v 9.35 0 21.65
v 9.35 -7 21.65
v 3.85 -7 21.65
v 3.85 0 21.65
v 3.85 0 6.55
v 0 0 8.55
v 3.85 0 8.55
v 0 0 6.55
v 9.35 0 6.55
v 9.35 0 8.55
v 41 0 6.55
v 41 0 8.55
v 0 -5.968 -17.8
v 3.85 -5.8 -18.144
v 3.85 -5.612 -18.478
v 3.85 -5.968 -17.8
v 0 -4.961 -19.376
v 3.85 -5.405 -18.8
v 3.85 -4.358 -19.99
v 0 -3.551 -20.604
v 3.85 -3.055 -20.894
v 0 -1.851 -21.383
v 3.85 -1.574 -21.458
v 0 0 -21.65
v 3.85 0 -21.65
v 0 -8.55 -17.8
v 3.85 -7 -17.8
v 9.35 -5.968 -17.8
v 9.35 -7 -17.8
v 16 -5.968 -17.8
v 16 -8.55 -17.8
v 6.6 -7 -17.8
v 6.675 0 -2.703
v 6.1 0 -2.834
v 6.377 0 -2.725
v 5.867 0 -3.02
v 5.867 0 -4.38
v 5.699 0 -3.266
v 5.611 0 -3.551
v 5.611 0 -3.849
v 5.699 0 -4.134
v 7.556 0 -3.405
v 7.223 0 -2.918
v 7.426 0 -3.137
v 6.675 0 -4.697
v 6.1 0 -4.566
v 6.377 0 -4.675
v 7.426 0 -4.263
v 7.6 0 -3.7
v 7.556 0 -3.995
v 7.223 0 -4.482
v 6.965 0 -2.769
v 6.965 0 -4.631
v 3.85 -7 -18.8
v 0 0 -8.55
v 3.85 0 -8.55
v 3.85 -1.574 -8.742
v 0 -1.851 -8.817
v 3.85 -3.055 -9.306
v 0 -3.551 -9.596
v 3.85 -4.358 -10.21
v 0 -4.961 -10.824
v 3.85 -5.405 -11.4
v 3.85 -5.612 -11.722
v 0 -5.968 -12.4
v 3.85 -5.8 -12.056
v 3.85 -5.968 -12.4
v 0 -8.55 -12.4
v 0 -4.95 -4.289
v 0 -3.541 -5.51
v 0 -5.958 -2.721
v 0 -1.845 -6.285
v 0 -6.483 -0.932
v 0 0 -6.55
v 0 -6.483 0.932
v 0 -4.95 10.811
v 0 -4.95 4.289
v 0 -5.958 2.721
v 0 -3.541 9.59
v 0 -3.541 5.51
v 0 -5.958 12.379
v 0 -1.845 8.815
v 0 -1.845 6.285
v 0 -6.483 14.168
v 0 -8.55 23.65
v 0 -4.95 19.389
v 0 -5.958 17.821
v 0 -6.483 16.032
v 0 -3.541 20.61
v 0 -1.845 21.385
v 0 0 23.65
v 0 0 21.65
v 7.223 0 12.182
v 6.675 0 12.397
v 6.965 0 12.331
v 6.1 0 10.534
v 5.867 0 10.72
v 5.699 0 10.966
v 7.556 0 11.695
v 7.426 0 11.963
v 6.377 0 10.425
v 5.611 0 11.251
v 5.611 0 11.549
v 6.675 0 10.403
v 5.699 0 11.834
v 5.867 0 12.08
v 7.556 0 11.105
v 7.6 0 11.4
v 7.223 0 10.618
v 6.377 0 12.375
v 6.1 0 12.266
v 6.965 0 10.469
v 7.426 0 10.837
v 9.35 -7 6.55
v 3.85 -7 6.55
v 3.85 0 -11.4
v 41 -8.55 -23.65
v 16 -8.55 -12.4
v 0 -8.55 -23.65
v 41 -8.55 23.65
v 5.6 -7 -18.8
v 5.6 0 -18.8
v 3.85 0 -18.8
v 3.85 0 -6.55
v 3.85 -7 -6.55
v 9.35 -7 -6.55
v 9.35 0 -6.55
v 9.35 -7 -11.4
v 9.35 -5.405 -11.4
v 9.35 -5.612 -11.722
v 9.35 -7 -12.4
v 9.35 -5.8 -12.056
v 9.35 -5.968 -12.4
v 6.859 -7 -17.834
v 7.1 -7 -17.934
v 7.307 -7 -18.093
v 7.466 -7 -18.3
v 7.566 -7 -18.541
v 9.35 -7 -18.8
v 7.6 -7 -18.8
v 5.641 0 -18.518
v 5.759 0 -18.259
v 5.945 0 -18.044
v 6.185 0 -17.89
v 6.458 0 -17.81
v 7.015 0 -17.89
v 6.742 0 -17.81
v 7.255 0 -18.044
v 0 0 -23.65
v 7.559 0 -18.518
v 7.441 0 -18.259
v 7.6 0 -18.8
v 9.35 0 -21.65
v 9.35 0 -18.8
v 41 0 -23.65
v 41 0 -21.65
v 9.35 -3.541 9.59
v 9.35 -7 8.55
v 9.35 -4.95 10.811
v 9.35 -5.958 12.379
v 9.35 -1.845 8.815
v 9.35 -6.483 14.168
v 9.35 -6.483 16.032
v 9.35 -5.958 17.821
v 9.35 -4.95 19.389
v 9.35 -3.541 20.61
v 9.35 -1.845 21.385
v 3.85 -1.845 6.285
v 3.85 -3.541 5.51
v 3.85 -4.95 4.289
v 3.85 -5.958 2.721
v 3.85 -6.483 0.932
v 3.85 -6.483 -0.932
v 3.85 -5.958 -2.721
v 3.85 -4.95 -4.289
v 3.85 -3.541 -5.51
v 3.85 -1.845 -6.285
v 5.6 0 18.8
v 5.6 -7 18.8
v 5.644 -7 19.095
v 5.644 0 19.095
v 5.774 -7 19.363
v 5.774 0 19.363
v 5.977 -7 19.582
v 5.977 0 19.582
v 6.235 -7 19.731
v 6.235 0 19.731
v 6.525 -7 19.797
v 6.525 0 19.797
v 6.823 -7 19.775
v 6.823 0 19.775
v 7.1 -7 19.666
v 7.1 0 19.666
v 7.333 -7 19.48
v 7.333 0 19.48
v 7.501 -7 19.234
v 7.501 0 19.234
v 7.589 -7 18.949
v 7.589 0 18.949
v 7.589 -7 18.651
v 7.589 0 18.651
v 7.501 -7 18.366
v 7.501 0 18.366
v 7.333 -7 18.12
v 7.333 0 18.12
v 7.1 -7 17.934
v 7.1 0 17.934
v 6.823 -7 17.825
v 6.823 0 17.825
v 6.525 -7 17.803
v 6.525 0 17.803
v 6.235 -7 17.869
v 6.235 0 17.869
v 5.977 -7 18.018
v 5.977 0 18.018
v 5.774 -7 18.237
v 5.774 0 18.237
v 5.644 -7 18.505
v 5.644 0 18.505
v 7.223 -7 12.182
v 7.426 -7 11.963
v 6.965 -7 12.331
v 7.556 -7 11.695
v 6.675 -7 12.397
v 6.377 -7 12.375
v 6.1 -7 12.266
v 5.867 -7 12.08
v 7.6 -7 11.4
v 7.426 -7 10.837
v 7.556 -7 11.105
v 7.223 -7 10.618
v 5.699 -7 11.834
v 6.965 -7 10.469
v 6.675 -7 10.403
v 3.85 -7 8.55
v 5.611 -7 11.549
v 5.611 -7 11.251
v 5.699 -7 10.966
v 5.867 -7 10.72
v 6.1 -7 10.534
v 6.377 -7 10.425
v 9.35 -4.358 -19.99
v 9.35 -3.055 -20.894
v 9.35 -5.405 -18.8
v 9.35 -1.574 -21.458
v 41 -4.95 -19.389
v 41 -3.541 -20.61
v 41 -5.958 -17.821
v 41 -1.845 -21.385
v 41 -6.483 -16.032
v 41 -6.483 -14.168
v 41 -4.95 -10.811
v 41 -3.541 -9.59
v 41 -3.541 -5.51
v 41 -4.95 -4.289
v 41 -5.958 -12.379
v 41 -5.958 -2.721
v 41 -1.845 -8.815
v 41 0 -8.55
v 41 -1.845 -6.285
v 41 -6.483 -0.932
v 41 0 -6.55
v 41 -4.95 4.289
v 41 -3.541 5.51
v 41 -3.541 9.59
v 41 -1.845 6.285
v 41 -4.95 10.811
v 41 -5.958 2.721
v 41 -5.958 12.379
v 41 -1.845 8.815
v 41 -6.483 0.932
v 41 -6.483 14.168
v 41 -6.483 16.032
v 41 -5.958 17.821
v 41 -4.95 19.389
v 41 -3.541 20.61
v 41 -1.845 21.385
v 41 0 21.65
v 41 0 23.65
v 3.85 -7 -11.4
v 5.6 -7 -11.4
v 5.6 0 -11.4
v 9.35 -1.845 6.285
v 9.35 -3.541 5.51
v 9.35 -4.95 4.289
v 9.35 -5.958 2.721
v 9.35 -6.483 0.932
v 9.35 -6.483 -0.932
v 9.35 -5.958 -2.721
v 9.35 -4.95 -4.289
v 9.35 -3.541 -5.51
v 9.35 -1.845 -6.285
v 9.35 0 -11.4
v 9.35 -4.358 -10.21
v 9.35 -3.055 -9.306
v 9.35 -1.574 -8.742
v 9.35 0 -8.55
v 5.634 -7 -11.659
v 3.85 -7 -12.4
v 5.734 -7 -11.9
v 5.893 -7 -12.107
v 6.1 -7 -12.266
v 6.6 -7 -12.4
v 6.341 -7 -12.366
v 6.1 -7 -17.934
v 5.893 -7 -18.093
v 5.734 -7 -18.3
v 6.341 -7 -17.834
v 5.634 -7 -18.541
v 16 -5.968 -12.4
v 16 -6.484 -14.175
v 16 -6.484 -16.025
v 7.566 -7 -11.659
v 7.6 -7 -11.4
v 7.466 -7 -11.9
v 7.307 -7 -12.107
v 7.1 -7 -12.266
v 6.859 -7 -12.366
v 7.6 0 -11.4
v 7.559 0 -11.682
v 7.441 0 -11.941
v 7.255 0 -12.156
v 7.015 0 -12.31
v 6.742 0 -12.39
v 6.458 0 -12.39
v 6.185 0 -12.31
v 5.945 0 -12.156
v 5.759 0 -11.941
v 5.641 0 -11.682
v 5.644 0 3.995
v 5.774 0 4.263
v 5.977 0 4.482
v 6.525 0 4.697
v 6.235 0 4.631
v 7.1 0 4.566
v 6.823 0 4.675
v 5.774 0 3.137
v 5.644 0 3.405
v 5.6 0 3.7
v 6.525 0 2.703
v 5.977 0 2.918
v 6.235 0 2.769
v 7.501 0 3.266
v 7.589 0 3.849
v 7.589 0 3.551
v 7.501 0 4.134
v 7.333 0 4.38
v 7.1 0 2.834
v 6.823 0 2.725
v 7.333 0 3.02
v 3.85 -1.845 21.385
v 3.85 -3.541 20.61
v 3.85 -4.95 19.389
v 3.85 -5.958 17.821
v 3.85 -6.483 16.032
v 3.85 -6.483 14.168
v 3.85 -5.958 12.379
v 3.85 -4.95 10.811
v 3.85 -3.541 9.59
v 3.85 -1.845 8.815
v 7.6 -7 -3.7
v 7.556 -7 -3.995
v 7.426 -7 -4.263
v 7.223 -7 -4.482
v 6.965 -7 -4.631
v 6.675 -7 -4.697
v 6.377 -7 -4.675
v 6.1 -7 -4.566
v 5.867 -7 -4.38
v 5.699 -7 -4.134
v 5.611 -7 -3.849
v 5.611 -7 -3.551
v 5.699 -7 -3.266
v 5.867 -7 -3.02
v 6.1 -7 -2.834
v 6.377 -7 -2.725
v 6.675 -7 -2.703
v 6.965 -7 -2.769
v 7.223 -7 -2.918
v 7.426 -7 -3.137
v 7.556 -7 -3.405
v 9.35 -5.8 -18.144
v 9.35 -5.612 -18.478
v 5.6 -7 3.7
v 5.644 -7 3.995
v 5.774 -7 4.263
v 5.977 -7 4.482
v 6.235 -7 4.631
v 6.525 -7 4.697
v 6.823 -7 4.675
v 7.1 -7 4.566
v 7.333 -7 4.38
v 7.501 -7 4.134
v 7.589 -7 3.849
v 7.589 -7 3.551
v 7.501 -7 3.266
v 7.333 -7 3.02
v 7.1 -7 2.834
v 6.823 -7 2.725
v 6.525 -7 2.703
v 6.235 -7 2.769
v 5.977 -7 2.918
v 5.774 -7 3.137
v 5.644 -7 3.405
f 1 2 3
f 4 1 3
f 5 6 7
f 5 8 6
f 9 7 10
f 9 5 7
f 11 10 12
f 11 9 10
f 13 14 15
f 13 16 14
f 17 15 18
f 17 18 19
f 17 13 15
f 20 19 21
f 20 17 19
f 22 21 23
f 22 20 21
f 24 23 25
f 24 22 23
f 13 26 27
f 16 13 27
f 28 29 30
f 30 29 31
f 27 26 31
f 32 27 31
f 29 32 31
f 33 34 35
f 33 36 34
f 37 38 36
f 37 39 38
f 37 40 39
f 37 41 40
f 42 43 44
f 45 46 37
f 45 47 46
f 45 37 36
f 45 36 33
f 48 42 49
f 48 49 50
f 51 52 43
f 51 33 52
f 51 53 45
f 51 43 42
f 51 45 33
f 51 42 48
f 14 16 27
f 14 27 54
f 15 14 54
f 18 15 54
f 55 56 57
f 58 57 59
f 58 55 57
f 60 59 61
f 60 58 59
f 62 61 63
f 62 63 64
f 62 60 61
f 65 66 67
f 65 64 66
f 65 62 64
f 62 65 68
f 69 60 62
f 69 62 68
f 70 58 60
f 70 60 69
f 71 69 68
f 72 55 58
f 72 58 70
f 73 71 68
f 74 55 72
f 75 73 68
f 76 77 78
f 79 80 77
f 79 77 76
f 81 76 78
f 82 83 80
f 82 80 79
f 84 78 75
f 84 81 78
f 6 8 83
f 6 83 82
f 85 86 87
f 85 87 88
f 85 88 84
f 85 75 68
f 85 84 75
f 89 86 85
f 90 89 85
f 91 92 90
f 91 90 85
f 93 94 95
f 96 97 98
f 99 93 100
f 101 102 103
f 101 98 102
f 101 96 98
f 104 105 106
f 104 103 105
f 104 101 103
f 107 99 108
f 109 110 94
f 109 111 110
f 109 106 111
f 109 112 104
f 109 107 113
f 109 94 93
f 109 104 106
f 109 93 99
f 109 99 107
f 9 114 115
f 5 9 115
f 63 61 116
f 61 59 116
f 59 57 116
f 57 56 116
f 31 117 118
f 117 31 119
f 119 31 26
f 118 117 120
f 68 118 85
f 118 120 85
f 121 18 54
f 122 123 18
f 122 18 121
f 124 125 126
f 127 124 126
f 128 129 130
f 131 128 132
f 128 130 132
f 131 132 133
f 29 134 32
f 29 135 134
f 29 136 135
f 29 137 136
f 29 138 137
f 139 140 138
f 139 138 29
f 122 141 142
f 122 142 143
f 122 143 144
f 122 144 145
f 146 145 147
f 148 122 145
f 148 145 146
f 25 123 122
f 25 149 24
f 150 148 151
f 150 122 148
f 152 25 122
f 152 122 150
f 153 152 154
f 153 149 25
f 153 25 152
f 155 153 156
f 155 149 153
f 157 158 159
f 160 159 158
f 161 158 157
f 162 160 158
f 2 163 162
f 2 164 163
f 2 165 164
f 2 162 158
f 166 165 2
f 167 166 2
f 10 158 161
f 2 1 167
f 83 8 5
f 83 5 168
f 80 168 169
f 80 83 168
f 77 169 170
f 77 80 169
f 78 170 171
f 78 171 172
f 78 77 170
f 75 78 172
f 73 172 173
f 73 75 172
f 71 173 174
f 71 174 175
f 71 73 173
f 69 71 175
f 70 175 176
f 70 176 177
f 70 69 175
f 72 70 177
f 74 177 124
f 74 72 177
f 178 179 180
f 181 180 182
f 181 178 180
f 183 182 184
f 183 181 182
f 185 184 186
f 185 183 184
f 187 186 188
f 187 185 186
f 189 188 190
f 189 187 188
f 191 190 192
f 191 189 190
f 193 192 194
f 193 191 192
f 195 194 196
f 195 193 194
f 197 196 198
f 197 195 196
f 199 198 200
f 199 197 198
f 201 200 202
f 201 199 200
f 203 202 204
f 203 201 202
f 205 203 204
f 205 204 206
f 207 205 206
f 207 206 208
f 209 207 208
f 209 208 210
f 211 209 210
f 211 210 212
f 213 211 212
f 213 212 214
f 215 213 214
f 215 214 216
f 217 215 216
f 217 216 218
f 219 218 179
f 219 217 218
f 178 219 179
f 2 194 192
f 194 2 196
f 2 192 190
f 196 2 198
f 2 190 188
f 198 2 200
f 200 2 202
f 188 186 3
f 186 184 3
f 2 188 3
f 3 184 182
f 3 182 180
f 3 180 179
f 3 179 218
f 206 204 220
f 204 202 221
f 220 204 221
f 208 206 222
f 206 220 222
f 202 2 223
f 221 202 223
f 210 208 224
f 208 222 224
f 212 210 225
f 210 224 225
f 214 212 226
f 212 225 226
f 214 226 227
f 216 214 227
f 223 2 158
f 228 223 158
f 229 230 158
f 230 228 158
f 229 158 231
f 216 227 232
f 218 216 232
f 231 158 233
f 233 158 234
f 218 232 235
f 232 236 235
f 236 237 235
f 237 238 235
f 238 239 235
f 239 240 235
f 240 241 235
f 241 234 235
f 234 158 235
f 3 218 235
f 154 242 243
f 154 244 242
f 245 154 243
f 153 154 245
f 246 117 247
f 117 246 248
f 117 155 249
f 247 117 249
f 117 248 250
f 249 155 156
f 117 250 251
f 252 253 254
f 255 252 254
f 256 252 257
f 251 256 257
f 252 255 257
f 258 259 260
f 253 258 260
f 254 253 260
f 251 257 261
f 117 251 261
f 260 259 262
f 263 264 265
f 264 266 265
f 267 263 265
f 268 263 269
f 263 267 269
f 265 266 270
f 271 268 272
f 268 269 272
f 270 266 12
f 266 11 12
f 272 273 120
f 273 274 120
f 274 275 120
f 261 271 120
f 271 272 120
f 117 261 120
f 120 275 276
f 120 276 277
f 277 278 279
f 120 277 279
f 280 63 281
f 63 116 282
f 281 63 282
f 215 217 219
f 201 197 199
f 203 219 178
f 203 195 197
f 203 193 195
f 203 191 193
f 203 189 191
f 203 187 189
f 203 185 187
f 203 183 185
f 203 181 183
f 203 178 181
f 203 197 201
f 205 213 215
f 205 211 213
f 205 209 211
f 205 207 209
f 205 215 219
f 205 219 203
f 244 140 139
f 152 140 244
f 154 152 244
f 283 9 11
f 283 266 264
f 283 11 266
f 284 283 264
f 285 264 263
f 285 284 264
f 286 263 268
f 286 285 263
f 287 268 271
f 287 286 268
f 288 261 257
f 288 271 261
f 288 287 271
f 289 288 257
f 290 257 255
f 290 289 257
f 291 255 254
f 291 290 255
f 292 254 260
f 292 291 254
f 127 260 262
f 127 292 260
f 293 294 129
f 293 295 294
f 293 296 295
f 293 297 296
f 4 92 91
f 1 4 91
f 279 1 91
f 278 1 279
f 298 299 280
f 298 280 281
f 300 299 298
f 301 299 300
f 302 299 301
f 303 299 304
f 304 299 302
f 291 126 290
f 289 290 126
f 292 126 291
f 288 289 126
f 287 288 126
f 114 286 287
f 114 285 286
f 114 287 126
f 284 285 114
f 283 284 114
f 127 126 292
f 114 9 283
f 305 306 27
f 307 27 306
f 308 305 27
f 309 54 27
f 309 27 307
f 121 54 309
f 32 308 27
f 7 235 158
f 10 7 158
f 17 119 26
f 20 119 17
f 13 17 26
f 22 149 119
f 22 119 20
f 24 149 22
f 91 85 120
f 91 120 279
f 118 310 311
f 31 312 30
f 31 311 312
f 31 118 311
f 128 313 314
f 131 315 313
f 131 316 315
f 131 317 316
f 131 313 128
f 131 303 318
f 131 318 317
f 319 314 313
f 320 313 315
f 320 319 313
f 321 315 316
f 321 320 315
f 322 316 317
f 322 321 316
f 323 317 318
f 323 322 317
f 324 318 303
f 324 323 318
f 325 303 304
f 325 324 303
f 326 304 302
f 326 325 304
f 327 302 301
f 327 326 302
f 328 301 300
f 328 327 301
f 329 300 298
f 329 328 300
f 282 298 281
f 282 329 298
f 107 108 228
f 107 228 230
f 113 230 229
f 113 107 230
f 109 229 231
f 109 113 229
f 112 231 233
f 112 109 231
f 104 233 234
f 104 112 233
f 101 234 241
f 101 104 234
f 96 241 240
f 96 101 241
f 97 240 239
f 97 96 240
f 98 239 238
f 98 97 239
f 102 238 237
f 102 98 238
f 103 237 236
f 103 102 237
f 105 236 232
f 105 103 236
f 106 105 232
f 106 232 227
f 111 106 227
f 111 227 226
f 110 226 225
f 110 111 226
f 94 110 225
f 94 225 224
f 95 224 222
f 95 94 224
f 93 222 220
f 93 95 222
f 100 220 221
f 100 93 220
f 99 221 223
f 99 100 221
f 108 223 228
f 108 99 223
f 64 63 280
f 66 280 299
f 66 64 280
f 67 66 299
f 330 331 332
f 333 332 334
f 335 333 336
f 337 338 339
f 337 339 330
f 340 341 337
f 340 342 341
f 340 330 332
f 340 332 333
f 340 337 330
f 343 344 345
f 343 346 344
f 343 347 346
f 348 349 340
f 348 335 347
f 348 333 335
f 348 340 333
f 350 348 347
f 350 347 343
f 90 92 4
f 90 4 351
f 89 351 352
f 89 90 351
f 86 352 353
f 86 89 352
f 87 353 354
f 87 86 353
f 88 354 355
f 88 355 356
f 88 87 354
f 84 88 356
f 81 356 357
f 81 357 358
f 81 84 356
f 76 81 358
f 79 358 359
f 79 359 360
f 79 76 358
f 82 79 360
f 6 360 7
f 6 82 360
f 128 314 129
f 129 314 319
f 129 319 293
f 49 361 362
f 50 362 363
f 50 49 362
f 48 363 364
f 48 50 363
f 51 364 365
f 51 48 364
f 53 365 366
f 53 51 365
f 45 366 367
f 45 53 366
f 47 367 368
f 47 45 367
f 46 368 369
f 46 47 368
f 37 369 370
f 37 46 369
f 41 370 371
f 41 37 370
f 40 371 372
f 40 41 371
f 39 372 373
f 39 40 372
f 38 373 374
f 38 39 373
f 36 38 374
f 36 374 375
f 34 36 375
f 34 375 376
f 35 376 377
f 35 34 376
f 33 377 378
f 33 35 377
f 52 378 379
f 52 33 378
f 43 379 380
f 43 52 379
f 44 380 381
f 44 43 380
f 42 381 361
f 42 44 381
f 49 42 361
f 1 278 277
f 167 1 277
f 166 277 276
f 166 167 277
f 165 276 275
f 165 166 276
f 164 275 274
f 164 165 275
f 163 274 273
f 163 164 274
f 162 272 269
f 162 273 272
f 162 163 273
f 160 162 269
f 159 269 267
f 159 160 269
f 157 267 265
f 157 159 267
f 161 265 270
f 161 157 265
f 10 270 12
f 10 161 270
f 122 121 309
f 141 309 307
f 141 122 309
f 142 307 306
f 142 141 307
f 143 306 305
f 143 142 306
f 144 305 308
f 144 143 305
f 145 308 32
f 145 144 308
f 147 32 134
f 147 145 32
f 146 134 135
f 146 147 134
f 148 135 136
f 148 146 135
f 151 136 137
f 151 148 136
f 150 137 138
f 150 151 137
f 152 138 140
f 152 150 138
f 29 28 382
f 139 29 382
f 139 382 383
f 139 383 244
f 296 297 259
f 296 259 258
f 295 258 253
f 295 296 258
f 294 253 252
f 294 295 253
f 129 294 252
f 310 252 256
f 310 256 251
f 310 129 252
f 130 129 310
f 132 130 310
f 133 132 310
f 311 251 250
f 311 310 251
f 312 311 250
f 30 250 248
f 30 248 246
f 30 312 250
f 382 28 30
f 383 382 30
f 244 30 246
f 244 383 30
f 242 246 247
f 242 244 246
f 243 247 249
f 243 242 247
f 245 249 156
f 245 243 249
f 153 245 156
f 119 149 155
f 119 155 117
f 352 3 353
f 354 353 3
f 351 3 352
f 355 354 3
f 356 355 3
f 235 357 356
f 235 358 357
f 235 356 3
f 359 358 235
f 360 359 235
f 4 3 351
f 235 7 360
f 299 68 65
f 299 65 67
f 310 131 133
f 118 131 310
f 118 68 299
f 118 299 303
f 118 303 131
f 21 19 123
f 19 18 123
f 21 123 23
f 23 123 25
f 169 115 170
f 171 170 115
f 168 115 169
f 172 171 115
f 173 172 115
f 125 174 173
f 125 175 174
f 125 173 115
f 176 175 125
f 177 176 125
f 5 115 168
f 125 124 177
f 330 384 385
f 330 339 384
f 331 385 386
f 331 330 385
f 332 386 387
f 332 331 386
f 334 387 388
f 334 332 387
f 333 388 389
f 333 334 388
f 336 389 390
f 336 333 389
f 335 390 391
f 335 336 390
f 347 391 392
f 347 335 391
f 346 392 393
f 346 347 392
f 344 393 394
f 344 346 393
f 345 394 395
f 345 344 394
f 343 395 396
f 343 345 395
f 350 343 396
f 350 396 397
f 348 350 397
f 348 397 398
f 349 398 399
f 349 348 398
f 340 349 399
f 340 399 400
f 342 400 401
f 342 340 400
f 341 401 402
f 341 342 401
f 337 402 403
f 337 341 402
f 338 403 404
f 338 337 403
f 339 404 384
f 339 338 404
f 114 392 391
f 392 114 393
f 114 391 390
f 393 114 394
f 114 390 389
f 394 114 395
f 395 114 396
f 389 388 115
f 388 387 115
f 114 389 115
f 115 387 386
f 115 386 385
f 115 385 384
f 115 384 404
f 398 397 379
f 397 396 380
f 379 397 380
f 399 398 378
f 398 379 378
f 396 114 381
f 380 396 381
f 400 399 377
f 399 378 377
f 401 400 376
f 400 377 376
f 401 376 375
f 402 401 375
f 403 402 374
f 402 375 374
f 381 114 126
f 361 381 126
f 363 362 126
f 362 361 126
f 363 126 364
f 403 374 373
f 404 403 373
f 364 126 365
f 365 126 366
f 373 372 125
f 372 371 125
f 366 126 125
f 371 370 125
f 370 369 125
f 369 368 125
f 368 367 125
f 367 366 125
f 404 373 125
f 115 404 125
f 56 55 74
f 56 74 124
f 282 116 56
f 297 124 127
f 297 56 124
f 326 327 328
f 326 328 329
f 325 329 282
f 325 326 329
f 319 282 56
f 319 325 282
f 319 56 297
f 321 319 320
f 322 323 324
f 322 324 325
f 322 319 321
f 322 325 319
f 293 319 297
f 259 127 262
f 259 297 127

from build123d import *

# Parameters (mm, degrees)
BOSS_EXTRUDE1_DEPTH     = 41
BOSS_EXTRUDE2_REACH     = 50.098
SKETCH2_R               = 1
SKETCH4_W               = 5.5
SKETCH4_H               = 13.1
SKETCH4_R               = 1
CUT_EXTRUDE1_DEPTH      = 7
SKETCH5_R               = 2.25
BOSS_EXTRUDE3_DEPTH     = 2
BOSS_EXTRUDE4_REACH     = 59.938
SKETCH6_W               = 5.5
SKETCH6_H               = 2.85
CUT_EXTRUDE2_DEPTH      = 7
SKETCH8_W               = 69.342775087
SKETCH8_H               = 71.486609824
SKETCH8_W_2             = 41
SKETCH8_H_2             = 47.3
CUT_EXTRUDE3_DEPTH      = 58.676674836
CUT_EXTRUDE4_DEPTH      = 48.846865116
CUT_EXTRUDE4_DEPTH_BACK = 48.846865116
SKETCH9_W               = 16
SKETCH9_H               = 5.4


with BuildPart() as part:
    # Sketch1 → Boss-Extrude1 (new body)
    with BuildSketch(Plane(origin=(0, 0, 0), x_dir=(0, 0, -1), z_dir=(1, 0, 0))):
        with BuildLine():
            Line((-8.55, 0), (-6.55, 0))
            ThreePointArc((-6.55, 0), (0, -6.55), (6.55, 0))
            Line((6.55, 0), (8.55, 0))
            ThreePointArc((8.55, 0), (15.1, -6.55), (21.65, 0))
            Line((21.65, 0), (23.65, 0))
            Line((23.65, 0), (23.65, -8.55))
            Line((23.65, -8.55), (-23.65, -8.55))
            Line((-23.65, -8.55), (-23.65, 0))
            Line((-23.65, 0), (-21.65, 0))
            ThreePointArc((-21.65, 0), (-15.1, -6.55), (-8.55, 0))
        make_face()
    extrude(amount=BOSS_EXTRUDE1_DEPTH)

    # Sketch2 → Boss-Extrude2 (add, up to next)
    with BuildSketch(Plane(origin=(0, 0, 0), x_dir=(1, 0, 0), z_dir=(0, 1, 0)), mode=Mode.PRIVATE) as boss_extrude2_sk1:
        with Locations(Location((6.6, 3.7, 0), (0, 0, 270))):
            Circle(SKETCH2_R)
    boss_extrude2_tool1 = extrude(boss_extrude2_sk1.sketch, amount=-BOSS_EXTRUDE2_REACH, mode=Mode.PRIVATE) - part.part
    # Sketch2 → Boss-Extrude2 (add, up to next)
    with BuildSketch(Plane(origin=(0, 0, 0), x_dir=(1, 0, 0), z_dir=(0, 1, 0)), mode=Mode.PRIVATE) as boss_extrude2_sk2:
        with Locations(Location((6.6, -3.7, 0), (0, 0, 270))):
            Circle(SKETCH2_R)
    boss_extrude2_tool2 = extrude(boss_extrude2_sk2.sketch, amount=-BOSS_EXTRUDE2_REACH, mode=Mode.PRIVATE) - part.part
    # Sketch2 → Boss-Extrude2 (add, up to next)
    with BuildSketch(Plane(origin=(0, 0, 0), x_dir=(1, 0, 0), z_dir=(0, 1, 0)), mode=Mode.PRIVATE) as boss_extrude2_sk3:
        with Locations(Location((6.6, -11.4, 0), (0, 0, 270))):
            Circle(SKETCH2_R)
    boss_extrude2_tool3 = extrude(boss_extrude2_sk3.sketch, amount=-BOSS_EXTRUDE2_REACH, mode=Mode.PRIVATE) - part.part
    # Sketch2 → Boss-Extrude2 (add, up to next)
    with BuildSketch(Plane(origin=(0, 0, 0), x_dir=(1, 0, 0), z_dir=(0, 1, 0)), mode=Mode.PRIVATE) as boss_extrude2_sk4:
        with Locations(Location((6.6, -18.8, 0), (0, 0, 270))):
            Circle(SKETCH2_R)
    boss_extrude2_tool4 = extrude(boss_extrude2_sk4.sketch, amount=-BOSS_EXTRUDE2_REACH, mode=Mode.PRIVATE) - part.part
    # Sketch2 → Boss-Extrude2 (add, up to next)
    with BuildSketch(Plane(origin=(0, 0, 0), x_dir=(1, 0, 0), z_dir=(0, 1, 0)), mode=Mode.PRIVATE) as boss_extrude2_sk5:
        with Locations(Location((6.6, 18.8, 0), (0, 0, 270))):
            Circle(SKETCH2_R)
    boss_extrude2_tool5 = extrude(boss_extrude2_sk5.sketch, amount=-BOSS_EXTRUDE2_REACH, mode=Mode.PRIVATE) - part.part
    # Sketch2 → Boss-Extrude2 (add, up to next)
    with BuildSketch(Plane(origin=(0, 0, 0), x_dir=(1, 0, 0), z_dir=(0, 1, 0)), mode=Mode.PRIVATE) as boss_extrude2_sk6:
        with Locations(Location((6.6, 11.4, 0), (0, 0, 270))):
            Circle(SKETCH2_R)
    boss_extrude2_tool6 = extrude(boss_extrude2_sk6.sketch, amount=-BOSS_EXTRUDE2_REACH, mode=Mode.PRIVATE) - part.part
    add(boss_extrude2_tool1.solids().sort_by_distance((6.6, 0, -3.7))[0])
    add(boss_extrude2_tool2.solids().sort_by_distance((6.6, 0, 3.7))[0])
    add(boss_extrude2_tool3.solids().sort_by_distance((6.6, 0, 11.4))[0])
    add(boss_extrude2_tool4.solids().sort_by_distance((6.6, 0, 18.8))[0])
    add(boss_extrude2_tool5.solids().sort_by_distance((6.6, 0, -18.8))[0])
    add(boss_extrude2_tool6.solids().sort_by_distance((6.6, 0, -11.4))[0])

    # Sketch4 → Cut-Extrude1 (cut)
    # profile 1 of 3: a face of its own
    with BuildSketch(Plane(origin=(0, 0, 0), x_dir=(1, 0, 0), z_dir=(0, 1, 0))):
        with Locations((6.6, 0)):
            Rectangle(SKETCH4_W, SKETCH4_H)
        with Locations(Location((6.6, 3.7, 0), (0, 0, 270))):
            Circle(SKETCH4_R, mode=Mode.SUBTRACT)
        with Locations(Location((6.6, -3.7, 0), (0, 0, 270))):
            Circle(SKETCH4_R, mode=Mode.SUBTRACT)
    # profile 2 of 3: a face of its own
    with BuildSketch(Plane(origin=(0, 0, 0), x_dir=(1, 0, 0), z_dir=(0, 1, 0))):
        with Locations((6.6, -15.1)):
            Rectangle(SKETCH4_W, SKETCH4_H)
        with Locations(Location((6.6, -11.4, 0), (0, 0, 90))):
            Circle(SKETCH4_R, mode=Mode.SUBTRACT)
        with Locations(Location((6.6, -18.8, 0), (0, 0, 90))):
            Circle(SKETCH4_R, mode=Mode.SUBTRACT)
    # profile 3 of 3: a face of its own
    with BuildSketch(Plane(origin=(0, 0, 0), x_dir=(1, 0, 0), z_dir=(0, 1, 0))):
        with Locations((6.6, 15.1)):
            Rectangle(SKETCH4_W, SKETCH4_H)
        with Locations(Location((6.6, 11.4, 0), (0, 0, 90))):
            Circle(SKETCH4_R, mode=Mode.SUBTRACT)
        with Locations(Location((6.6, 18.8, 0), (0, 0, 90))):
            Circle(SKETCH4_R, mode=Mode.SUBTRACT)
    extrude(amount=-CUT_EXTRUDE1_DEPTH, mode=Mode.SUBTRACT)

    # Sketch5 → Boss-Extrude3 (add)
    # profile 1 of 4: a face of its own
    with BuildSketch(Plane.XZ.offset(8.55)):
        with BuildLine():
            Line((0, 23.65), (0, 20.65))
            Line((0, 20.65), (-5.25520382, 20.65))
            ThreePointArc((-5.25520382, 20.65), (-6.669417382, 21.235786438), (-7.25520382, 22.65))
            Line((-7.25520382, 22.65), (-7.25520382, 28.90520382))
            ThreePointArc((-7.25520382, 28.90520382), (-6.669417382, 30.319417382), (-5.25520382, 30.90520382))
            Line((-5.25520382, 30.90520382), (1, 30.90520382))
            ThreePointArc((1, 30.90520382), (2.414213562, 30.319417382), (3, 28.90520382))
            Line((3, 28.90520382), (3, 23.65))
            Line((3, 23.65), (0, 23.65))
        make_face()
        with Locations(Location((-3.00520382, 26.65520382, 0), (0, 0, 270))):
            Circle(SKETCH5_R, mode=Mode.SUBTRACT)
    # profile 2 of 4: a face of its own
    with BuildSketch(Plane.XZ.offset(8.55)):
        with BuildLine():
            Line((0, -23.65), (3, -23.65))
            Line((3, -23.65), (3, -28.90520382))
            ThreePointArc((3, -28.90520382), (2.414213562, -30.319417382), (1, -30.90520382))
            Line((1, -30.90520382), (-5.25520382, -30.90520382))
            ThreePointArc((-5.25520382, -30.90520382), (-6.669417382, -30.319417382), (-7.25520382, -28.90520382))
            Line((-7.25520382, -28.90520382), (-7.25520382, -22.65))
            ThreePointArc((-7.25520382, -22.65), (-6.669417382, -21.235786438), (-5.25520382, -20.65))
            Line((-5.25520382, -20.65), (0, -20.65))
            Line((0, -20.65), (0, -23.65))
        make_face()
        with Locations(Location((-3.00520382, -26.65520382, 0), (0, 0, 90))):
            Circle(SKETCH5_R, mode=Mode.SUBTRACT)
    # profile 3 of 4: a face of its own
    with BuildSketch(Plane.XZ.offset(8.55)):
        with BuildLine():
            Line((41, -23.65), (41, -20.65))
            Line((41, -20.65), (46.25520382, -20.65))
            ThreePointArc((46.25520382, -20.65), (47.669417382, -21.235786438), (48.25520382, -22.65))
            Line((48.25520382, -22.65), (48.25520382, -28.90520382))
            ThreePointArc((48.25520382, -28.90520382), (47.669417382, -30.319417382), (46.25520382, -30.90520382))
            Line((46.25520382, -30.90520382), (40, -30.90520382))
            ThreePointArc((40, -30.90520382), (38.585786438, -30.319417382), (38, -28.90520382))
            Line((38, -28.90520382), (38, -23.65))
            Line((38, -23.65), (41, -23.65))
        make_face()
        with Locations(Location((44.00520382, -26.65520382, 0), (0, 0, 270))):
            Circle(SKETCH5_R, mode=Mode.SUBTRACT)
    # profile 4 of 4: a face of its own
    with BuildSketch(Plane.XZ.offset(8.55)):
        with BuildLine():
            Line((41, 23.65), (38, 23.65))
            Line((38, 23.65), (38, 28.90520382))
            ThreePointArc((38, 28.90520382), (38.585786438, 30.319417382), (40, 30.90520382))
            Line((40, 30.90520382), (46.25520382, 30.90520382))
            ThreePointArc((46.25520382, 30.90520382), (47.669417382, 30.319417382), (48.25520382, 28.90520382))
            Line((48.25520382, 28.90520382), (48.25520382, 22.65))
            ThreePointArc((48.25520382, 22.65), (47.669417382, 21.235786438), (46.25520382, 20.65))
            Line((46.25520382, 20.65), (41, 20.65))
            Line((41, 20.65), (41, 23.65))
        make_face()
        with Locations(Location((44.00520382, 26.65520382, 0), (0, 0, 90))):
            Circle(SKETCH5_R, mode=Mode.SUBTRACT)
    extrude(amount=-BOSS_EXTRUDE3_DEPTH)

    # Boss-Extrude4: up to this face of the body (flat: up to its plane)
    boss_extrude4_end = Plane(part.part.faces().sort_by_distance((6.6, -7, -15.1))[0])
    # Sketch6 → Boss-Extrude4 (add, up to the picked face)
    with BuildSketch(Plane(origin=(0, 0, 0), x_dir=(1, 0, 0), z_dir=(0, 1, 0)), mode=Mode.PRIVATE) as boss_extrude4_sk1:
        with Locations((6.6, -5.125)):
            Rectangle(SKETCH6_W, SKETCH6_H)
    boss_extrude4_tool1 = split(extrude(boss_extrude4_sk1.sketch, amount=-BOSS_EXTRUDE4_REACH, mode=Mode.PRIVATE), bisect_by=boss_extrude4_end, keep=Keep.BOTH, mode=Mode.PRIVATE)
    # Sketch6 → Boss-Extrude4 (add, up to the picked face)
    with BuildSketch(Plane(origin=(0, 0, 0), x_dir=(1, 0, 0), z_dir=(0, 1, 0)), mode=Mode.PRIVATE) as boss_extrude4_sk2:
        with Locations((6.6, 5.125)):
            Rectangle(SKETCH6_W, SKETCH6_H)
    boss_extrude4_tool2 = split(extrude(boss_extrude4_sk2.sketch, amount=-BOSS_EXTRUDE4_REACH, mode=Mode.PRIVATE), bisect_by=boss_extrude4_end, keep=Keep.BOTH, mode=Mode.PRIVATE)
    # Sketch6 → Boss-Extrude4 (add, up to the picked face)
    with BuildSketch(Plane(origin=(0, 0, 0), x_dir=(1, 0, 0), z_dir=(0, 1, 0)), mode=Mode.PRIVATE) as boss_extrude4_sk3:
        with Locations((6.6, -20.225)):
            Rectangle(SKETCH6_W, SKETCH6_H)
    boss_extrude4_tool3 = split(extrude(boss_extrude4_sk3.sketch, amount=-BOSS_EXTRUDE4_REACH, mode=Mode.PRIVATE), bisect_by=boss_extrude4_end, keep=Keep.BOTH, mode=Mode.PRIVATE)
    # Sketch6 → Boss-Extrude4 (add, up to the picked face)
    with BuildSketch(Plane(origin=(0, 0, 0), x_dir=(1, 0, 0), z_dir=(0, 1, 0)), mode=Mode.PRIVATE) as boss_extrude4_sk4:
        with Locations((6.6, -9.975)):
            Rectangle(SKETCH6_W, SKETCH6_H)
    boss_extrude4_tool4 = split(extrude(boss_extrude4_sk4.sketch, amount=-BOSS_EXTRUDE4_REACH, mode=Mode.PRIVATE), bisect_by=boss_extrude4_end, keep=Keep.BOTH, mode=Mode.PRIVATE)
    # Sketch6 → Boss-Extrude4 (add, up to the picked face)
    with BuildSketch(Plane(origin=(0, 0, 0), x_dir=(1, 0, 0), z_dir=(0, 1, 0)), mode=Mode.PRIVATE) as boss_extrude4_sk5:
        with Locations((6.6, 9.975)):
            Rectangle(SKETCH6_W, SKETCH6_H)
    boss_extrude4_tool5 = split(extrude(boss_extrude4_sk5.sketch, amount=-BOSS_EXTRUDE4_REACH, mode=Mode.PRIVATE), bisect_by=boss_extrude4_end, keep=Keep.BOTH, mode=Mode.PRIVATE)
    # Sketch6 → Boss-Extrude4 (add, up to the picked face)
    with BuildSketch(Plane(origin=(0, 0, 0), x_dir=(1, 0, 0), z_dir=(0, 1, 0)), mode=Mode.PRIVATE) as boss_extrude4_sk6:
        with Locations((6.6, 20.225)):
            Rectangle(SKETCH6_W, SKETCH6_H)
    boss_extrude4_tool6 = split(extrude(boss_extrude4_sk6.sketch, amount=-BOSS_EXTRUDE4_REACH, mode=Mode.PRIVATE), bisect_by=boss_extrude4_end, keep=Keep.BOTH, mode=Mode.PRIVATE)
    add(boss_extrude4_tool1.solids().sort_by(Axis((6.6, 0, 5.125), (0, -1, 0)))[0])
    add(boss_extrude4_tool2.solids().sort_by(Axis((6.6, 0, -5.125), (0, -1, 0)))[0])
    add(boss_extrude4_tool3.solids().sort_by(Axis((6.6, 0, 20.225), (0, -1, 0)))[0])
    add(boss_extrude4_tool4.solids().sort_by(Axis((6.6, 0, 9.975), (0, -1, 0)))[0])
    add(boss_extrude4_tool5.solids().sort_by(Axis((6.6, 0, -9.975), (0, -1, 0)))[0])
    add(boss_extrude4_tool6.solids().sort_by(Axis((6.6, 0, -20.225), (0, -1, 0)))[0])

    # Sketch7 → Cut-Extrude2 (cut)
    with BuildSketch(Plane(origin=(0, 0, 0), x_dir=(1, 0, 0), z_dir=(0, 1, 0))):
        with BuildLine():
            Line((5.6, 3.7), (3.85, 3.7))
            Line((3.85, 3.7), (3.85, 6.55))
            Line((3.85, 6.55), (9.35, 6.55))
            Line((9.35, 6.55), (9.35, 3.7))
            Line((9.35, 3.7), (7.6, 3.7))
            ThreePointArc((7.6, 3.7), (6.6, 4.7), (5.6, 3.7))
        make_face()
        with BuildLine():
            Line((7.6, -3.7), (9.35, -3.7))
            Line((9.35, -3.7), (9.35, -6.55))
            Line((9.35, -6.55), (3.85, -6.55))
            Line((3.85, -6.55), (3.85, -3.7))
            Line((3.85, -3.7), (5.6, -3.7))
            ThreePointArc((5.6, -3.7), (6.6, -4.7), (7.6, -3.7))
        make_face()
        with BuildLine():
            Line((5.6, -11.4), (3.85, -11.4))
            Line((3.85, -11.4), (3.85, -8.55))
            Line((3.85, -8.55), (9.35, -8.55))
            Line((9.35, -8.55), (9.35, -11.4))
            Line((9.35, -11.4), (7.6, -11.4))
            ThreePointArc((7.6, -11.4), (6.6, -10.4), (5.6, -11.4))
        make_face()
        with BuildLine():
            Line((7.6, -18.8), (9.35, -18.8))
            Line((9.35, -18.8), (9.35, -21.65))
            Line((9.35, -21.65), (3.85, -21.65))
            Line((3.85, -21.65), (3.85, -18.8))
            Line((3.85, -18.8), (5.6, -18.8))
            ThreePointArc((5.6, -18.8), (6.6, -19.8), (7.6, -18.8))
        make_face()
    extrude(amount=-CUT_EXTRUDE2_DEPTH, mode=Mode.SUBTRACT)

    # Sketch8 → Cut-Extrude3 (cut, through all)
    with BuildSketch(Plane(origin=(0, -6.55, 0), x_dir=(1, 0, 0), z_dir=(0, 1, 0))):
        with Locations((17.956765915, 2.528550286)):
            Rectangle(SKETCH8_W, SKETCH8_H)
        with Locations((20.5, 0)):
            Rectangle(SKETCH8_W_2, SKETCH8_H_2, mode=Mode.SUBTRACT)
    extrude(amount=-CUT_EXTRUDE3_DEPTH, mode=Mode.SUBTRACT)

    # Sketch9 → Cut-Extrude4 (cut, two sides: drawn at the far end of the back side and taken through both)
    with BuildSketch(Plane(origin=(0, -7, 0), x_dir=(1, 0, 0), z_dir=(0, 1, 0)).offset(-CUT_EXTRUDE4_DEPTH_BACK)):
        with Locations((8, 15.1)):
            Rectangle(SKETCH9_W, SKETCH9_H)
    extrude(amount=CUT_EXTRUDE4_DEPTH + CUT_EXTRUDE4_DEPTH_BACK, mode=Mode.SUBTRACT)


solid = part.part
